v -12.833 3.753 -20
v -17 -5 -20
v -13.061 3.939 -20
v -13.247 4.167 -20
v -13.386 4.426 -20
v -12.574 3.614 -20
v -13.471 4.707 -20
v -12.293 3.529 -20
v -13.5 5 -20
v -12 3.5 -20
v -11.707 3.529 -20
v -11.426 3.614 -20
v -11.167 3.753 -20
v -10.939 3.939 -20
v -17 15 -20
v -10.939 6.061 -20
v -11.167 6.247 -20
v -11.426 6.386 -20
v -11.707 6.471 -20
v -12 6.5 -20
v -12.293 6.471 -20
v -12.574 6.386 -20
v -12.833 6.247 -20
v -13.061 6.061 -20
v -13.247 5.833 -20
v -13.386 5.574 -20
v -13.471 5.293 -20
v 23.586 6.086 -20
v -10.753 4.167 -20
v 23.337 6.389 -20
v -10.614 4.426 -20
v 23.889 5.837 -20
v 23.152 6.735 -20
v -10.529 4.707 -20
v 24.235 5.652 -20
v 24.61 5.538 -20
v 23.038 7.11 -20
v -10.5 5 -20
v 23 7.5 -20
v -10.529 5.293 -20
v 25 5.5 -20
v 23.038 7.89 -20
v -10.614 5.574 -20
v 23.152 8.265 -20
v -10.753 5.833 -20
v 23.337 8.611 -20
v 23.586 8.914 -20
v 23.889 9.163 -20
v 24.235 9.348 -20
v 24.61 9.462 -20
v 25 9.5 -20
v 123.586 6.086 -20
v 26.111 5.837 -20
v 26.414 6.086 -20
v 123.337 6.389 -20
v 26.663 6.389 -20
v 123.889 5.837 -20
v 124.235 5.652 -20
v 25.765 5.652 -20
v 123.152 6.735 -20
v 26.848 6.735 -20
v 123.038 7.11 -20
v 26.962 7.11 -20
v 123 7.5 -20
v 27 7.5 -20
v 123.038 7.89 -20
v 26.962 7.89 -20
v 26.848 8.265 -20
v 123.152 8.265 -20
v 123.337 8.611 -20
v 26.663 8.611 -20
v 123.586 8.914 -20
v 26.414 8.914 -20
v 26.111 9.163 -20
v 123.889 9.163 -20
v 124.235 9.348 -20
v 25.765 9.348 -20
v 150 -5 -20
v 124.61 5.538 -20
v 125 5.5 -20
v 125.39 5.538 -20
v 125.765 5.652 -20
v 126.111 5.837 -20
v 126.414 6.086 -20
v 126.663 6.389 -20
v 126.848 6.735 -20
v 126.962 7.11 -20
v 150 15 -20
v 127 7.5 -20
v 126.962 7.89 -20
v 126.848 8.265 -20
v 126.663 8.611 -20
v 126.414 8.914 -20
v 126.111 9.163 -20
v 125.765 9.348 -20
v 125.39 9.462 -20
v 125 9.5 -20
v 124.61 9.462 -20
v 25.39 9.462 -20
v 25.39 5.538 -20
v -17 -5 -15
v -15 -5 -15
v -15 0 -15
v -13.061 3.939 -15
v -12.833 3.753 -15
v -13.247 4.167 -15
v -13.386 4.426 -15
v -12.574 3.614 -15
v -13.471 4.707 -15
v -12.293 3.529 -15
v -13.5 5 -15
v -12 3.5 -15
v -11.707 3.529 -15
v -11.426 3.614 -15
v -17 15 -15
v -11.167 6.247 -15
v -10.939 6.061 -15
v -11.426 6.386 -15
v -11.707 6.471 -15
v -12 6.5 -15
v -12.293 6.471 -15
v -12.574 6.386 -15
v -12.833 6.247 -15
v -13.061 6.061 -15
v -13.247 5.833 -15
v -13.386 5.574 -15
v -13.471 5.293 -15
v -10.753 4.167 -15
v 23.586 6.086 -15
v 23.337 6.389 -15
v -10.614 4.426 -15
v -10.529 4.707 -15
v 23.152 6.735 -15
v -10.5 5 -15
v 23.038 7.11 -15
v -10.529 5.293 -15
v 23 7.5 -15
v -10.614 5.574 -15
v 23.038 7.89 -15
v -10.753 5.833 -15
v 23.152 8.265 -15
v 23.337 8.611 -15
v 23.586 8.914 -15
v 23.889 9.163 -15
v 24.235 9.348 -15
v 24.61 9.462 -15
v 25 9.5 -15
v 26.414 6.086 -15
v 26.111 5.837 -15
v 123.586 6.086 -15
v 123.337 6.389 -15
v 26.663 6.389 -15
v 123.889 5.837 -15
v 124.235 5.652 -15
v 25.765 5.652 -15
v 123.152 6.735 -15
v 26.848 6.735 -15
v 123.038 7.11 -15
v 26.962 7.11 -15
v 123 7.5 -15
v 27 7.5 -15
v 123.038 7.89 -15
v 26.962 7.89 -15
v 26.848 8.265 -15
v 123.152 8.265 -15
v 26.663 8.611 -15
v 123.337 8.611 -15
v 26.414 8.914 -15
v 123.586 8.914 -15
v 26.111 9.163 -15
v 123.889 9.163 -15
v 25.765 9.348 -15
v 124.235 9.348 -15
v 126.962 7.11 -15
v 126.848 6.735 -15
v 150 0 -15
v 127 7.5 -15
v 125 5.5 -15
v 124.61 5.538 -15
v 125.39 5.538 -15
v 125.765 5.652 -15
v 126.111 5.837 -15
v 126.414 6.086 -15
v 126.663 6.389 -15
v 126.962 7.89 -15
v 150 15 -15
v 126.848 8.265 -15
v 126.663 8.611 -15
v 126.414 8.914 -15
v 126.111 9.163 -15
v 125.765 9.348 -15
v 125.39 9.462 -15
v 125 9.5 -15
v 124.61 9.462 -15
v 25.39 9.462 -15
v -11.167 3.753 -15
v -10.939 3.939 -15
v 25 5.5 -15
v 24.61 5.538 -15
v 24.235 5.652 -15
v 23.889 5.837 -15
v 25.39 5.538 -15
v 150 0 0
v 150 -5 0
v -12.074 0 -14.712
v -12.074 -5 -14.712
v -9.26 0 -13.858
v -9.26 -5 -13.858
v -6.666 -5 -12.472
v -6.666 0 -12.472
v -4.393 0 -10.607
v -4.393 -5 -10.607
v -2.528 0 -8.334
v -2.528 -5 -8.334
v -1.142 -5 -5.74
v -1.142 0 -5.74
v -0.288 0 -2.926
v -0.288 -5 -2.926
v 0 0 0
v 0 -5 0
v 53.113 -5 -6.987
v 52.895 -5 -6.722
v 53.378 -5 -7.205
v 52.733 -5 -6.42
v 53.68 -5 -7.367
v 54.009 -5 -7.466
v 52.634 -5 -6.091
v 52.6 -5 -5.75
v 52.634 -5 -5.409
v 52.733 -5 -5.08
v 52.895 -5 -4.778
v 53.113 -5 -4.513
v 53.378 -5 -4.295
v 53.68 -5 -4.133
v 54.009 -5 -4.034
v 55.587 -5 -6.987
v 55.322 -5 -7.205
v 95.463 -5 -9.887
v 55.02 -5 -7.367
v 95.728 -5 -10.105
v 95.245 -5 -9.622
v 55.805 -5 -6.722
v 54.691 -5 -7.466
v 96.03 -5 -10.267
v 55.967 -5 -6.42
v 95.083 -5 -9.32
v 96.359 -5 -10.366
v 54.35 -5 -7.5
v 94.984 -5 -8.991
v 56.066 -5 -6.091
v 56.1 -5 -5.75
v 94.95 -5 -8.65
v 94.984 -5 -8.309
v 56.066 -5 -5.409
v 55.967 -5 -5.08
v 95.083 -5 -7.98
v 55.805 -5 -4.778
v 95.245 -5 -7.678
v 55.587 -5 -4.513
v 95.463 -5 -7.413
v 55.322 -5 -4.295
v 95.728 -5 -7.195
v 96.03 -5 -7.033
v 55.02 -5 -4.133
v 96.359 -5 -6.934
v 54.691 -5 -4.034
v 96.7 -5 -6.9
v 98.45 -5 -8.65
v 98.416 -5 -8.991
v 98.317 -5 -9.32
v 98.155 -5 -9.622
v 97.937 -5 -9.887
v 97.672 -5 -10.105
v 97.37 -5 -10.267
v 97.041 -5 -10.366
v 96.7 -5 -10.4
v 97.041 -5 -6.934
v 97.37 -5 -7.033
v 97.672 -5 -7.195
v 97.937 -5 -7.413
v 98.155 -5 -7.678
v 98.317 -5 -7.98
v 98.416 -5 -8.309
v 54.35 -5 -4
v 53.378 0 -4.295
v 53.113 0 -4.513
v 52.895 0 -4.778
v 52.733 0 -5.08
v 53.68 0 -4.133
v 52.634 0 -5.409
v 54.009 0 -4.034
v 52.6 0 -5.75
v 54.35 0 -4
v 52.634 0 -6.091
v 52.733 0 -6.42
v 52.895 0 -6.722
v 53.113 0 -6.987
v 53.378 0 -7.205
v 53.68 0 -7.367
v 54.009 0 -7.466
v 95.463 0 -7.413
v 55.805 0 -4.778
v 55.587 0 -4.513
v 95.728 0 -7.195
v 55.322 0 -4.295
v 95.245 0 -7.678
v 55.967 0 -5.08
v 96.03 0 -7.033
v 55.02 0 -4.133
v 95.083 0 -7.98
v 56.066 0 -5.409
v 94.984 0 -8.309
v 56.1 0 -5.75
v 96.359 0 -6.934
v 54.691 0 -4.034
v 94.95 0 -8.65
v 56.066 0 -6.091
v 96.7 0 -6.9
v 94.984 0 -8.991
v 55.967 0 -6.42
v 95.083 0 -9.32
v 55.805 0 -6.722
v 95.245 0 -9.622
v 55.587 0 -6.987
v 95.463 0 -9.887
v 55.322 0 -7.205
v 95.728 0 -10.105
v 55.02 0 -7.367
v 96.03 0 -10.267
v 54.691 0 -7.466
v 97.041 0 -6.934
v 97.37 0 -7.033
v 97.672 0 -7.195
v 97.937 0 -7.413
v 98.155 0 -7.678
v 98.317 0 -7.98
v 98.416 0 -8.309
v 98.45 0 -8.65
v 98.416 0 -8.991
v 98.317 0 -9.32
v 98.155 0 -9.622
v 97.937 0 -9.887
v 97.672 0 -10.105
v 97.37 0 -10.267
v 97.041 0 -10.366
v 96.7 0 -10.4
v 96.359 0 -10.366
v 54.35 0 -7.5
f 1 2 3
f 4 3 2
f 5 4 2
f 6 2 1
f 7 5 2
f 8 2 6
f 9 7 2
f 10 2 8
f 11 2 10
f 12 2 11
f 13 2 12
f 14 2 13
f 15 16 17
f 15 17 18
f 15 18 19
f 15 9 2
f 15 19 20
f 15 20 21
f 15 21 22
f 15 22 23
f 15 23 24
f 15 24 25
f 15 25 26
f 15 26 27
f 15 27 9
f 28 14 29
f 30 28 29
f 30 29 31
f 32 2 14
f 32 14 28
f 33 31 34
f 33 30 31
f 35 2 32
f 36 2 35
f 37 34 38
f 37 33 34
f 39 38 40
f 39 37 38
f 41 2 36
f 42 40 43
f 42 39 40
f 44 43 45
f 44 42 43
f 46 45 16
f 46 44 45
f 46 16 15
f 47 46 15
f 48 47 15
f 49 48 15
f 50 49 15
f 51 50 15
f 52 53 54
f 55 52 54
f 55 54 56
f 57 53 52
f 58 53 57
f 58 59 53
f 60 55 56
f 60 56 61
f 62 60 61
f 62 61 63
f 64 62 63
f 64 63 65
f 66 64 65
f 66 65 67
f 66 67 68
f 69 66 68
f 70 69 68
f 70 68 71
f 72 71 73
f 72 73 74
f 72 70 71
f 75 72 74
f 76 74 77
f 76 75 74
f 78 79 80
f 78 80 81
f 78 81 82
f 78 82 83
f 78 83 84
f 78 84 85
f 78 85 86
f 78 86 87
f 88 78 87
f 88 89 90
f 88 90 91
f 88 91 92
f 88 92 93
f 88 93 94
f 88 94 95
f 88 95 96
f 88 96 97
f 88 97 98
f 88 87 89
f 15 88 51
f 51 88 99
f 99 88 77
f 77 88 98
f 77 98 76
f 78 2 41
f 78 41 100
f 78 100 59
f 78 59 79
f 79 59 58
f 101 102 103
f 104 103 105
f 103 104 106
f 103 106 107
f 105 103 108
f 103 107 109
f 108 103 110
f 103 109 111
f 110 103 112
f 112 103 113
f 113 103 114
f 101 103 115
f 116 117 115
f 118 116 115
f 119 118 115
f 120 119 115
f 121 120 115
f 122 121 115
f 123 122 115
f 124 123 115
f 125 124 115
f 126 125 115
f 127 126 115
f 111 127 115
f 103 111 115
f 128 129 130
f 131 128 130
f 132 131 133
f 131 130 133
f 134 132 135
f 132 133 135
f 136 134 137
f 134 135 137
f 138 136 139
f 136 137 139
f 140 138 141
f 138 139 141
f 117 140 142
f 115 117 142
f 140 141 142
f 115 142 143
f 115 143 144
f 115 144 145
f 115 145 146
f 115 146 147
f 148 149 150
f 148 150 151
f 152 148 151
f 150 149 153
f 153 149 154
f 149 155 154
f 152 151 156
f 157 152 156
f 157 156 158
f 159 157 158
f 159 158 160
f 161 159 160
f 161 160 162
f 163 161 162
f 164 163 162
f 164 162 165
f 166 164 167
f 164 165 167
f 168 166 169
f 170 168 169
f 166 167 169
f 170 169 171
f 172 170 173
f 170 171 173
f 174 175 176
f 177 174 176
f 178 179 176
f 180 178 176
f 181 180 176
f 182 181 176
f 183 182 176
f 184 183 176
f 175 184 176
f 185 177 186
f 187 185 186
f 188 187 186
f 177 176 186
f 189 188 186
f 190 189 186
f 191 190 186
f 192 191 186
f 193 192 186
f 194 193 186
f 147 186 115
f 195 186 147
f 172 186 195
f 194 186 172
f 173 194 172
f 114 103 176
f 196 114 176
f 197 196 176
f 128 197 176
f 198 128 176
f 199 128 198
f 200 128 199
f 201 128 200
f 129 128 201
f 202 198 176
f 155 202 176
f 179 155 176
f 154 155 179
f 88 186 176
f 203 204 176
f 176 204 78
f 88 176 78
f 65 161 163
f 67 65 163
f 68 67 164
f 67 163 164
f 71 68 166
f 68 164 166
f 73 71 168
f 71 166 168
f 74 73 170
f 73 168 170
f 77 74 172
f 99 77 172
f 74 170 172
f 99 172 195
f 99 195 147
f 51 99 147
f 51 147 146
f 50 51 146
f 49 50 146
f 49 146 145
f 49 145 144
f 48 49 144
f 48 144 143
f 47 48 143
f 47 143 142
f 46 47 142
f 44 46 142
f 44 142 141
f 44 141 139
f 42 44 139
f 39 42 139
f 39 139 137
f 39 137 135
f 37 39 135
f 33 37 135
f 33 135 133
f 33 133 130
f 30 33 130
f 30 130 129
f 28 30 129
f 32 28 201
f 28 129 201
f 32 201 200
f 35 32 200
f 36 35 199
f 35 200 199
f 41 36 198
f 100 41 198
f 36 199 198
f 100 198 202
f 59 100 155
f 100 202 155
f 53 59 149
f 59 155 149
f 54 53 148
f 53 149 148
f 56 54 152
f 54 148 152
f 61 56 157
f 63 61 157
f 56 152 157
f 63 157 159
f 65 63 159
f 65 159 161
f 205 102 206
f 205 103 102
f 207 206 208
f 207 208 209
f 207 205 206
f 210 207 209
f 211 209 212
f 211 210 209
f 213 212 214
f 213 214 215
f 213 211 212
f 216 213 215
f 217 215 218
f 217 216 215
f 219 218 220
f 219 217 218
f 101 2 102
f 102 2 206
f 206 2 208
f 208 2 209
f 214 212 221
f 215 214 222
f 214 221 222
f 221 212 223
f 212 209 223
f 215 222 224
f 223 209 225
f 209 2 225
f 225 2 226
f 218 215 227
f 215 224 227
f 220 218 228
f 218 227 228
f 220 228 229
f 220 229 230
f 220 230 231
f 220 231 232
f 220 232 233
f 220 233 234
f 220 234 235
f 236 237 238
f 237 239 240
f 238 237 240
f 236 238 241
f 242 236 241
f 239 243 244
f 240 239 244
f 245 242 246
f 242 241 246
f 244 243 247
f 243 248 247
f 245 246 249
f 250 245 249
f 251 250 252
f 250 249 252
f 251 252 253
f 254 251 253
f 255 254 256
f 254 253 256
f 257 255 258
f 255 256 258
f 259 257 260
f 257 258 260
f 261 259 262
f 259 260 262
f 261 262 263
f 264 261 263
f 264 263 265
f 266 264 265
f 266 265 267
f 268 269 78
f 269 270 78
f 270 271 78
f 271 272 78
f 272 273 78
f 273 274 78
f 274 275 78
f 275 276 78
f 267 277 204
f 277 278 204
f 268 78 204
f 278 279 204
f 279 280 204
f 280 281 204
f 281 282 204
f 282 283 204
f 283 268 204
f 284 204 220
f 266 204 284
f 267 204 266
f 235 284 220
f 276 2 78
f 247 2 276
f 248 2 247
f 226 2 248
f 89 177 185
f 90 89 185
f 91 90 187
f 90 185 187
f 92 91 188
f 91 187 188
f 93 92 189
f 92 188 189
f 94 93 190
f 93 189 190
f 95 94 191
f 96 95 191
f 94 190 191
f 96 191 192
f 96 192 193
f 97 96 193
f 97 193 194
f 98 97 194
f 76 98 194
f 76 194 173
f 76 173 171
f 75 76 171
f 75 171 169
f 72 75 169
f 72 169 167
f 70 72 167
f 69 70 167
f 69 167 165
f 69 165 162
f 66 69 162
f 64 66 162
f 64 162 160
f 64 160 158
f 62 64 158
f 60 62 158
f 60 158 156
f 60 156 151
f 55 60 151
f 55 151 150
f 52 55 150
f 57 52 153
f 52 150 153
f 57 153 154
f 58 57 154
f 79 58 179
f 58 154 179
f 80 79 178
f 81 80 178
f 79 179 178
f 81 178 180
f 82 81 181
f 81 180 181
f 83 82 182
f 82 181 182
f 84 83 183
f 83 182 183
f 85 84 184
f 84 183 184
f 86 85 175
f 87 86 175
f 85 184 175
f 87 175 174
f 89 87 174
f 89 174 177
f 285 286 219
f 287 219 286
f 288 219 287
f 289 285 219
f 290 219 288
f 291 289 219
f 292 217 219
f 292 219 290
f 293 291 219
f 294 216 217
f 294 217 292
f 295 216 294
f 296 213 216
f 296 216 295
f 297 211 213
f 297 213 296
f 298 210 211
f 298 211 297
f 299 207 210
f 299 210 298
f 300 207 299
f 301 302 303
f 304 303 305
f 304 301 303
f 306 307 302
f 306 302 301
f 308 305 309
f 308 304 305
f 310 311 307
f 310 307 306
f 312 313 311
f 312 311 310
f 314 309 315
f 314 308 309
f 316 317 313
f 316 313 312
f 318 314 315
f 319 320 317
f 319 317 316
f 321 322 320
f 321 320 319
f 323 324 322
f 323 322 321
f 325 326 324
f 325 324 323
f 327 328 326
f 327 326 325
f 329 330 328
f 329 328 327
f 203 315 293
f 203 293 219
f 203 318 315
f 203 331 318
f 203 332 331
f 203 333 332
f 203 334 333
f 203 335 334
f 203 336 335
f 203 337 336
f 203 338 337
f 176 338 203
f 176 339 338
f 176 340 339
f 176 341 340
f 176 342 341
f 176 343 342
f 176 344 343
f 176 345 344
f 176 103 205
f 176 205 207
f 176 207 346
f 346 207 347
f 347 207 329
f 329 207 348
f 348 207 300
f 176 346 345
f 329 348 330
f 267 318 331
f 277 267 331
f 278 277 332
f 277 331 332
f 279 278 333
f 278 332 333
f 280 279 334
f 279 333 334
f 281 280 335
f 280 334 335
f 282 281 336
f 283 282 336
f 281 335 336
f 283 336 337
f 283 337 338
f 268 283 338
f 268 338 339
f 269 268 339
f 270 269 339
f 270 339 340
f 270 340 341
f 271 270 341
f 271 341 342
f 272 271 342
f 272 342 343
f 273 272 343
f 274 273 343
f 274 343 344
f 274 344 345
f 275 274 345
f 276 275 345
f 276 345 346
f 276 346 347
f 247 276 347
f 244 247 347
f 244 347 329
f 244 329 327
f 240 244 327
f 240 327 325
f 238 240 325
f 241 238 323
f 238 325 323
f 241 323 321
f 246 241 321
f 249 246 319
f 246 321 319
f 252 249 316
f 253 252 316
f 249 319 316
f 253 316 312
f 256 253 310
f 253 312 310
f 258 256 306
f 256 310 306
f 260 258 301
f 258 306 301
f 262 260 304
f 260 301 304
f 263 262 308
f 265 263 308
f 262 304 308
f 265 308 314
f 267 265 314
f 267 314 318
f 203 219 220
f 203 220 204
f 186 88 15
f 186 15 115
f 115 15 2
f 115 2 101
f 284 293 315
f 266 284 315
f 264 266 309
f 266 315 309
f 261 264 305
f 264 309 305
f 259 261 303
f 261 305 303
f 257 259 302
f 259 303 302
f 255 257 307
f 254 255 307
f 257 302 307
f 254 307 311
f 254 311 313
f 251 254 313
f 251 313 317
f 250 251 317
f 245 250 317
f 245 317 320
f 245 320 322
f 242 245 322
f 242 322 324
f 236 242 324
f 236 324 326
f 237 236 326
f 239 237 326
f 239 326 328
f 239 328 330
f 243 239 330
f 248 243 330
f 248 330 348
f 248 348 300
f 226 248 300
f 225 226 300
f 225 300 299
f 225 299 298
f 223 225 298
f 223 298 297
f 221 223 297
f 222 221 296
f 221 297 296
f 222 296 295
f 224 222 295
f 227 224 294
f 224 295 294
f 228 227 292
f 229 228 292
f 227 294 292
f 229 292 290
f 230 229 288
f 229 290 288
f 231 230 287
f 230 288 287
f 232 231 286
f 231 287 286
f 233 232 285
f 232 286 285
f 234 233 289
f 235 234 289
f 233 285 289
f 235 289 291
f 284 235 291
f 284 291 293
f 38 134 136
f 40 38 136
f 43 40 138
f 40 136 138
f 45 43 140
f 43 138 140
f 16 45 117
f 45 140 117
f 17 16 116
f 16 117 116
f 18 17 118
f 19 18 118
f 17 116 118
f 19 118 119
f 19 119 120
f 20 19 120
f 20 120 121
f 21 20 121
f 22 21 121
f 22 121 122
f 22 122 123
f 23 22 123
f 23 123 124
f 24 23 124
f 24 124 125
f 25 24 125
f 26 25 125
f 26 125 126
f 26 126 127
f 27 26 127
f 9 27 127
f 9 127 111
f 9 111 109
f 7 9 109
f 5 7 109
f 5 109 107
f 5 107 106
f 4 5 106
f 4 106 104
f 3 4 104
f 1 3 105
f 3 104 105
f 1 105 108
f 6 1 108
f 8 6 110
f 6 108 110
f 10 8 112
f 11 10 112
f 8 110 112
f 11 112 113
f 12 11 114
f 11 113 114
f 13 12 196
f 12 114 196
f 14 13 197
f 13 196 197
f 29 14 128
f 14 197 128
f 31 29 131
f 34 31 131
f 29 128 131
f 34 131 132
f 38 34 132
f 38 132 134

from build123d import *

# Parameters (mm, degrees)
SKETCH1_W           = 150
SKETCH1_H           = 20
BOSS_EXTRUDE1_DEPTH = 5
SKETCH3_W           = 150
SKETCH3_H           = 5
BOSS_EXTRUDE2_DEPTH = 15
SKETCH5_R           = 2
CUT_EXTRUDE1_DEPTH  = 152.492574075
SKETCH6_R           = 1.75
CUT_EXTRUDE2_DEPTH  = 153.069063257
SKETCH7_W           = 5
SKETCH7_H           = 20
BOSS_EXTRUDE3_DEPTH = 17
SKETCH8_R           = 1.5
CUT_EXTRUDE3_DEPTH  = 152.492574075
FILLET2_R           = 15


with BuildPart() as part:
    # Sketch1 → Boss-Extrude1 (new body)
    with BuildSketch(Plane(origin=(0, 0, 0), x_dir=(1, 0, 0), z_dir=(0, 1, 0))):
        with Locations((75, 10)):
            Rectangle(SKETCH1_W, SKETCH1_H)
    extrude(amount=-BOSS_EXTRUDE1_DEPTH)

    # Sketch3 → Boss-Extrude2 (add)
    with BuildSketch(Plane(origin=(0, 0, 0), x_dir=(1, 0, 0), z_dir=(0, 1, 0))):
        with Locations((75, 17.5)):
            Rectangle(SKETCH3_W, SKETCH3_H)
    extrude(amount=BOSS_EXTRUDE2_DEPTH)

    # Sketch5 → Cut-Extrude1 (cut, through all)
    with BuildSketch(Plane.XY.offset(-15)):
        with Locations((25, 7.5)):
            Circle(SKETCH5_R)
        with Locations((125, 7.5)):
            Circle(SKETCH5_R)
    extrude(amount=-CUT_EXTRUDE1_DEPTH, mode=Mode.SUBTRACT)

    # Sketch6 → Cut-Extrude2 (cut, through all)
    with BuildSketch(Plane(origin=(0, 0, 0), x_dir=(1, 0, 0), z_dir=(0, 1, 0))):
        with Locations(Location((54.35, 5.75, 0), (0, 0, 270))):
            Circle(SKETCH6_R)
        with Locations(Location((96.7, 8.65, 0), (0, 0, 270))):
            Circle(SKETCH6_R)
    extrude(amount=-CUT_EXTRUDE2_DEPTH, mode=Mode.SUBTRACT)

    # Sketch7 → Boss-Extrude3 (add)
    with BuildSketch(Plane.ZY):
        with Locations((-17.5, 5)):
            Rectangle(SKETCH7_W, SKETCH7_H)
    extrude(amount=BOSS_EXTRUDE3_DEPTH)

    # Sketch8 → Cut-Extrude3 (cut, through all)
    with BuildSketch(Plane.XY.offset(-15)):
        with Locations((-12, 5)):
            Circle(SKETCH8_R)
    extrude(amount=-CUT_EXTRUDE3_DEPTH, mode=Mode.SUBTRACT)

    # Fillet2
    fillet2_edges = [part.edges().sort_by_distance(p)[0] for p in [
        (0, -2.5, -15),
    ]]
    fillet(fillet2_edges, radius=FILLET2_R - 0.0001)  # a hair under: the kernel refuses the full size


solid = part.part
